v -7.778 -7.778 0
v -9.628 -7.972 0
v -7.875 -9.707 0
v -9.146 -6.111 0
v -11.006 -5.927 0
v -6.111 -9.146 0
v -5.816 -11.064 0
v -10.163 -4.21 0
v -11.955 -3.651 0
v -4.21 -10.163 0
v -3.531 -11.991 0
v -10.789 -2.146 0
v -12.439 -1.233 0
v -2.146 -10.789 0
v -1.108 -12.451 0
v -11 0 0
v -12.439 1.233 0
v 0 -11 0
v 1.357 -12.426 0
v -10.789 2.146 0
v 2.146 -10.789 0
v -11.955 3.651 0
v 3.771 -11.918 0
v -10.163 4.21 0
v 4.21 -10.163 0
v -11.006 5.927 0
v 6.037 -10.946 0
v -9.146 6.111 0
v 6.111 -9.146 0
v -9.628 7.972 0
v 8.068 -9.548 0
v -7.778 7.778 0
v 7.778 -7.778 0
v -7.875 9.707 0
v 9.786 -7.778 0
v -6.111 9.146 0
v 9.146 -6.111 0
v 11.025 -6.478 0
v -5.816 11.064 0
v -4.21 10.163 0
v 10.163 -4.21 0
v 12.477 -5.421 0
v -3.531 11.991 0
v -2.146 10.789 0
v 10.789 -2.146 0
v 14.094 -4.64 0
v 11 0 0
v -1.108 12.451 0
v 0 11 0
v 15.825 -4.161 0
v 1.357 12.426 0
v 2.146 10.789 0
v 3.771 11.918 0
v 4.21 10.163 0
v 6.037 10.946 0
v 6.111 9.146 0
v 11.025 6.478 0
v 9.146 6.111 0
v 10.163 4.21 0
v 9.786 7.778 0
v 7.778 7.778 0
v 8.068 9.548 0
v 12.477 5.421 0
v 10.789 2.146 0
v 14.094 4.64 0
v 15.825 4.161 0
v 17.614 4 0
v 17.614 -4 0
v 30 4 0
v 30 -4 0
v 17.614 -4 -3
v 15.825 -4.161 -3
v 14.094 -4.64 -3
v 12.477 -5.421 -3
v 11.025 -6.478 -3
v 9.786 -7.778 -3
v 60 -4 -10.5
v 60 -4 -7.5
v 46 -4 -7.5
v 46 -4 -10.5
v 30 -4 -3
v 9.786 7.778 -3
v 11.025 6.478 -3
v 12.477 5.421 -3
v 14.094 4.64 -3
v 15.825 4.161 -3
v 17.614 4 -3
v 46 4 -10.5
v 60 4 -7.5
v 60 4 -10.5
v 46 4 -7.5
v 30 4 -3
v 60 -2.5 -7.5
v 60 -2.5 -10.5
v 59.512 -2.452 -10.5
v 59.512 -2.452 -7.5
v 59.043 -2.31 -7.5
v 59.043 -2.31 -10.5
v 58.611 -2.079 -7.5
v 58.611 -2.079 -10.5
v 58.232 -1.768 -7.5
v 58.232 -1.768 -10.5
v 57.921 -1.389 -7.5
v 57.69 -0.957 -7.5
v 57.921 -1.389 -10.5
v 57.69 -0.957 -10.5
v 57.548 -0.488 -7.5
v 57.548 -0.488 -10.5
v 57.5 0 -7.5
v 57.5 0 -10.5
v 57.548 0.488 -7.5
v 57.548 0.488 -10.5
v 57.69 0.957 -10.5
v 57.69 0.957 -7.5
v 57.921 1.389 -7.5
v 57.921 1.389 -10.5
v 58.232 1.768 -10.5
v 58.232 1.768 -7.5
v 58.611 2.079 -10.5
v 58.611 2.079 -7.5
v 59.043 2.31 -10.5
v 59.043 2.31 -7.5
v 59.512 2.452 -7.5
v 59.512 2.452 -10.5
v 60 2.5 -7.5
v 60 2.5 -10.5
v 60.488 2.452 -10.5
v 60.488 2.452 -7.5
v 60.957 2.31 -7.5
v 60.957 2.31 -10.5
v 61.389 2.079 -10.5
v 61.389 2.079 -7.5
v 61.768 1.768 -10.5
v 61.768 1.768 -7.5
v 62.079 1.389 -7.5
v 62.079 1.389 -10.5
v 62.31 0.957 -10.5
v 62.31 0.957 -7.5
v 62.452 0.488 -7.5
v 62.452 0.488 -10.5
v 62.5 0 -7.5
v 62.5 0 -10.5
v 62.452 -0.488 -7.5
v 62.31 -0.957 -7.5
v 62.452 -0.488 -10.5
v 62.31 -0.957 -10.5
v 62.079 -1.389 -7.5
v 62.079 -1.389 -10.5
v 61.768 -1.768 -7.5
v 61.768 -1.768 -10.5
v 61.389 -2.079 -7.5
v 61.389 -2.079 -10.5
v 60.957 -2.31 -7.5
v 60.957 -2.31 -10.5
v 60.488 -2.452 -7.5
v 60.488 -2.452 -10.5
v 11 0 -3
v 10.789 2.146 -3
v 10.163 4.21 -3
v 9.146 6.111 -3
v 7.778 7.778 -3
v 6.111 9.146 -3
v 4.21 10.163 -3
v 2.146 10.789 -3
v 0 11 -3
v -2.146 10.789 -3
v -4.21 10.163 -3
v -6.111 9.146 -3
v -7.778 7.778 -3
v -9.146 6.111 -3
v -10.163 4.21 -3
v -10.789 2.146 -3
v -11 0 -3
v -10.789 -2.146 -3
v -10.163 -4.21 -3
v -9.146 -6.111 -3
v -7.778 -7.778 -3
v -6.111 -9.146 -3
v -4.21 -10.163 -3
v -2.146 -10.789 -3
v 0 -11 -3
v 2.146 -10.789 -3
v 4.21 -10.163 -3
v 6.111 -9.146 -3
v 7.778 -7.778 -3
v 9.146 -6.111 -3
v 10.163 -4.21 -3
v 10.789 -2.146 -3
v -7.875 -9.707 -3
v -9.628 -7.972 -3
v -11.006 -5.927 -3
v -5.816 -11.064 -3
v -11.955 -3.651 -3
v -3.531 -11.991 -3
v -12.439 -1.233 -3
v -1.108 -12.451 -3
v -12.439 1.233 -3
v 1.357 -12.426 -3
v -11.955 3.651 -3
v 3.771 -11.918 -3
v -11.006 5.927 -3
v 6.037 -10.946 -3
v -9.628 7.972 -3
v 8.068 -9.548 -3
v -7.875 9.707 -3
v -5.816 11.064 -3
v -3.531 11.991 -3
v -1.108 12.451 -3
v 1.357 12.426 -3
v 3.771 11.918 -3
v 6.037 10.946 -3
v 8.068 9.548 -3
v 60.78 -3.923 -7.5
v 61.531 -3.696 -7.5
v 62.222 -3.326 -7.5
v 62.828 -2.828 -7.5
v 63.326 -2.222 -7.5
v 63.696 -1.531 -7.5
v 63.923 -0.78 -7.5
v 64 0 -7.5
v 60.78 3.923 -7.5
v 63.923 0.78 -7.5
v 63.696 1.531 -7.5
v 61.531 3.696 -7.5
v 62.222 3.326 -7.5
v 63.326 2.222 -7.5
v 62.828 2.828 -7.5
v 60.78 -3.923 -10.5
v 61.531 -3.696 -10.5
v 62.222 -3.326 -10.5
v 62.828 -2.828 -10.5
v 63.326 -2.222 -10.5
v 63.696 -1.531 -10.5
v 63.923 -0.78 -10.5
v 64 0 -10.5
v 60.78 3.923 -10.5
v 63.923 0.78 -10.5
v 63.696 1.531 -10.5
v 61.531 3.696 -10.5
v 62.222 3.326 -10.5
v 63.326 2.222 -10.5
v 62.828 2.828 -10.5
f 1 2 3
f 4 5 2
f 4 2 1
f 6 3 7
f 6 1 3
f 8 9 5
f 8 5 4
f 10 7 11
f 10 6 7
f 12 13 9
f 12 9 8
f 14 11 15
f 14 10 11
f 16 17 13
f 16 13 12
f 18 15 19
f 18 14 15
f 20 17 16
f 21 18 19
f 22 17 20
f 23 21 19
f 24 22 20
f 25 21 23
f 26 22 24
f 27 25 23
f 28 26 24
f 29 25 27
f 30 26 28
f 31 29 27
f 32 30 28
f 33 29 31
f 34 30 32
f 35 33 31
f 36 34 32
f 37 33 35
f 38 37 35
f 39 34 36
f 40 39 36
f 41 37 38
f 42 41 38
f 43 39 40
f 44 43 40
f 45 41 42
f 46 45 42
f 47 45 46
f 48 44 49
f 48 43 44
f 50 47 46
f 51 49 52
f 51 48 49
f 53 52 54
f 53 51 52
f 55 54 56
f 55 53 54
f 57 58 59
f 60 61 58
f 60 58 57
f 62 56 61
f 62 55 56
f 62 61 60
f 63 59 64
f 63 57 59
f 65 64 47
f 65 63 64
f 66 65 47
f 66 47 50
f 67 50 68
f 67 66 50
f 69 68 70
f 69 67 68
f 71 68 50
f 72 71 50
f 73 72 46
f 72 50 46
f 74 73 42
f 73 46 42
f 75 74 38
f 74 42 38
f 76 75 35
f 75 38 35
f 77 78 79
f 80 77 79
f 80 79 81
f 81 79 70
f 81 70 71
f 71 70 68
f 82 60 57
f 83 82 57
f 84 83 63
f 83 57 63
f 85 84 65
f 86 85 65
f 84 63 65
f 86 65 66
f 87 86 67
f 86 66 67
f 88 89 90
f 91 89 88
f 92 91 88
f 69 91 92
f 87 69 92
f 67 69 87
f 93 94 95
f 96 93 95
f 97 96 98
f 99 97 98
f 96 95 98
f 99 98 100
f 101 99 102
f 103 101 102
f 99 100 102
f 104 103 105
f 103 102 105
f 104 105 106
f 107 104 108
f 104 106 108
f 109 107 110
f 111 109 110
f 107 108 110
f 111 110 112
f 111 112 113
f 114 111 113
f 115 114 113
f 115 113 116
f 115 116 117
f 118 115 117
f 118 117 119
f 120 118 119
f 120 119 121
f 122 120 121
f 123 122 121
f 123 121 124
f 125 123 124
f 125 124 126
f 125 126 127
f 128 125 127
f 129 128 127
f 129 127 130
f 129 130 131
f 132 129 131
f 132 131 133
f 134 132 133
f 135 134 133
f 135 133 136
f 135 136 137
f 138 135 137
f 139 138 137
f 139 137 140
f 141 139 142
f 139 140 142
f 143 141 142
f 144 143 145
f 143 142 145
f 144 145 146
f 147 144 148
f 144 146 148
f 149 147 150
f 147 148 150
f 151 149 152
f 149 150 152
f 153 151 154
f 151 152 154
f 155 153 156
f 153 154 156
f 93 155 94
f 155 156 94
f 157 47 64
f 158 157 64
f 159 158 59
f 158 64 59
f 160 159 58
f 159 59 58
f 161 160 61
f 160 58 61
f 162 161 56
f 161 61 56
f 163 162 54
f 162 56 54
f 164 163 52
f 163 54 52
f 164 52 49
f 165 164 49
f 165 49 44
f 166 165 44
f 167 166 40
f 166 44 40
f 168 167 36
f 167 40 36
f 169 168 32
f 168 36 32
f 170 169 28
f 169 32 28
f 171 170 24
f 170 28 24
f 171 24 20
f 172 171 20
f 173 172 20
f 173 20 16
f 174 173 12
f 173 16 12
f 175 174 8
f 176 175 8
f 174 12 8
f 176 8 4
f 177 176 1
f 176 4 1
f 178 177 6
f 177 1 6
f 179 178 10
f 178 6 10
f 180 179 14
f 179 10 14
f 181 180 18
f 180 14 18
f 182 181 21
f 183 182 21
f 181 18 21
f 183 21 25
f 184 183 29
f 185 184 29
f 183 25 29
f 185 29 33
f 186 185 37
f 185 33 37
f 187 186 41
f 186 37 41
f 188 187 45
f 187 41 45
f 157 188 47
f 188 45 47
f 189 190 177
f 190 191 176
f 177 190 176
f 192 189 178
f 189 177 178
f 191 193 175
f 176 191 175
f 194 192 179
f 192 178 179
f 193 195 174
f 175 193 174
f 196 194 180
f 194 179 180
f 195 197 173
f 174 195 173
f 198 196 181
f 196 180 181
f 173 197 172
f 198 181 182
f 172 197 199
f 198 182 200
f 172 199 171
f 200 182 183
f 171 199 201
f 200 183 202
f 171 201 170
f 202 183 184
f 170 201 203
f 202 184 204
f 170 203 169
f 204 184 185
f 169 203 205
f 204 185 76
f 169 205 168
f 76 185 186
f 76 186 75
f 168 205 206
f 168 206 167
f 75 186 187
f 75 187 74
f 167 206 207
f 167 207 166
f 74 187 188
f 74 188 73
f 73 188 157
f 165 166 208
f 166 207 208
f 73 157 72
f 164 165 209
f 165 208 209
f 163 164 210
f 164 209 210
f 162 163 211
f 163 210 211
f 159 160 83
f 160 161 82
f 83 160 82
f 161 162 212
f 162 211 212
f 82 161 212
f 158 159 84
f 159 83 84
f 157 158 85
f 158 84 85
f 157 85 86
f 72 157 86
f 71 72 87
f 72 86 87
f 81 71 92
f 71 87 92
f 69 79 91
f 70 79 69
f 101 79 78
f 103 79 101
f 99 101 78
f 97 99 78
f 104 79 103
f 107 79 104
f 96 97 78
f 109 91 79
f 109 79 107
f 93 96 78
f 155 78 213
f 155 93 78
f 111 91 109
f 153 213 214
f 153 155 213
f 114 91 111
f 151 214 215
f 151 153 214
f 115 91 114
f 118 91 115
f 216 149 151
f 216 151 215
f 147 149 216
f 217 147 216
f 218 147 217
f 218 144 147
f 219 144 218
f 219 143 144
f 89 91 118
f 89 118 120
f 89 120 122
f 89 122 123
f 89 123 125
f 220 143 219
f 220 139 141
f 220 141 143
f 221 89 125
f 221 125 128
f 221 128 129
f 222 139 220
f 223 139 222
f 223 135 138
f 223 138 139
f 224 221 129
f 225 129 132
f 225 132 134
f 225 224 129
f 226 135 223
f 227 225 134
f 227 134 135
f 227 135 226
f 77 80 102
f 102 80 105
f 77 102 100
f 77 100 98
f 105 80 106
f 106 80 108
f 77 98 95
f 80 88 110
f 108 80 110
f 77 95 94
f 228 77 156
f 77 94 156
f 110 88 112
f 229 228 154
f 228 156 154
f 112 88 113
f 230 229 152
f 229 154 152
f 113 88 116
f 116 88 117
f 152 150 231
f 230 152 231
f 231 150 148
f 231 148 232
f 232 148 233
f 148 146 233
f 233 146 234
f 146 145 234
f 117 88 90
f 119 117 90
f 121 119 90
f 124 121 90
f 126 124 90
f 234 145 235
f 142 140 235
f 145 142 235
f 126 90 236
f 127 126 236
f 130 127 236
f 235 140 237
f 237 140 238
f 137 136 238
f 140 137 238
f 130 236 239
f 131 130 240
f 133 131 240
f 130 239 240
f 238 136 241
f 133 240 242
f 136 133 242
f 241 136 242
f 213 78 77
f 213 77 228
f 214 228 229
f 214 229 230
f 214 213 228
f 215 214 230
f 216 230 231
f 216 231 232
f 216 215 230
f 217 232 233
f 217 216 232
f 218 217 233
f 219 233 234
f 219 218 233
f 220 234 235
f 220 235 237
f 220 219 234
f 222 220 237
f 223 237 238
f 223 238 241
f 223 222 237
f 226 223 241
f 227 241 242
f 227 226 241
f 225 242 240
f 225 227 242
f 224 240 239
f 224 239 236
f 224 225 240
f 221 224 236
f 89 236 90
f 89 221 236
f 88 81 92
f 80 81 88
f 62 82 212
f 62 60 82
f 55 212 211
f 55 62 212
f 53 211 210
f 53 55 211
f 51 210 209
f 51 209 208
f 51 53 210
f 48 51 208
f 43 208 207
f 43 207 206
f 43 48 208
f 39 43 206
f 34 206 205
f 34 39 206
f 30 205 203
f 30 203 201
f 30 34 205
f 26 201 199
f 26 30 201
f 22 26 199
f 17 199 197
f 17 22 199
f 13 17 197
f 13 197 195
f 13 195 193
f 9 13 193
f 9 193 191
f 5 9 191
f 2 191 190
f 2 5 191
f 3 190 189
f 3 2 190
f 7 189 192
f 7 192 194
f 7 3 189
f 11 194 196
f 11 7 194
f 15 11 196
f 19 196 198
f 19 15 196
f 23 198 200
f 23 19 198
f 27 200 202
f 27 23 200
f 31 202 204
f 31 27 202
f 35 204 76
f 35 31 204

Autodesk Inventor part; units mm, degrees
ref_plane "YZ Plane" through (0, 0, 0) normal (1, 0, 0) x (0, 1, 0)
ref_plane "XY Plane" through (0, 0, 0) normal (0, 0, 1) x (1, 0, 0)
sketch "Sketch1" plane through (0, 0, 0) normal (0, 0, 1) x (1, 0, 0)
  arc A0 (9.7855, 7.7778) -> (9.7855, -7.7778) centre (0, 0) ccw
  circle A1 centre (0, 0) radius 11
  arc A2 (60, -4) -> (60, 4) centre (60, 0) ccw
  line L0 (60, 4) -> (17.6139, 4) construction
  line L1 (60, -4) -> (17.6139, -4) construction
  arc A3 (17.6139, -4) -> (9.7855, -7.7778) centre (17.6139, -14) ccw
  arc A4 (9.7855, 7.7778) -> (17.6139, 4) centre (17.6139, 14) ccw
  line L2 (30, 4) -> (30, -4) construction
  line L3 (17.6139, -4) -> (17.6139, 4)
  point P0 (11.8427, 4)
  point P1 (11.8427, -4)
  point P2 (-12.5, 0)
  point P3 (30, 0)
  dimension "d0" = 25
  dimension "d1" = 22
  dimension "d2" = 4
  dimension "d3" = 10
  dimension "d4" = 60
  dimension "d17" = 42.5
extrude "Extrusion1" add sketch "Sketch1" against normal blind 3
ref_plane "Work Plane3" through (0, 0, 0) normal (0, 1, 0) x (-1, 0, 0)
sketch "Sketch7" plane through (0, 0, 0) normal (0, 1, 0) x (-1, 0, 0)
  line L0 (-17.6139, 0) -> (-17.6139, -3) projected
  line L1 (-17.6139, -3) -> (-30, -3)
  line L2 (-30, -3) -> (-46, -10.5)
  line L3 (-46, -10.5) -> (-60, -10.5)
  line L4 (-60, -10.5) -> (-60, -7.5)
  line L5 (-60, -7.5) -> (-46, -7.5)
  line L6 (-46, -7.5) -> (-30, 0)
  line L7 (-30, 0) -> (-17.6139, 0)
  line L8 (-17.6139, -3) -> (-17.6139, 0)
  point P0 (0, 0)
  point P1 (-60, -9)
  dimension "d19" = 7.5
  dimension "d20" = 14
  dimension "d21" = 60
  dimension "d22" = 3
extrude "Extrusion3" add sketch "Sketch7" along normal mid plane 8
sketch "Sketch8" plane through (46, 4, -7.5) normal (0, 0, 1) x (1, 0, 0)
  line L0 (14, -8) -> (14, 0) projected
  arc A0 (14, -8) -> (14, 0) centre (14, -4) ccw
  point P0 (-46, -4)
  dimension "d25" = 4
extrude "Extrusion4" add sketch "Sketch8" against normal up to surface (3 mm away)
sketch "Sketch9" plane through (46, -4, -7.5) normal (0, 0, 1) x (1, 0, 0)
  arc A0 (14, 0) -> (14, 8) centre (14, 4) ccw projected
  point P0 (-46, 4)
hole "Hole1" at (60, 0, -7.5) direction (0, 0, -1) diameter 5 depth 3
properties part number "15_3"
